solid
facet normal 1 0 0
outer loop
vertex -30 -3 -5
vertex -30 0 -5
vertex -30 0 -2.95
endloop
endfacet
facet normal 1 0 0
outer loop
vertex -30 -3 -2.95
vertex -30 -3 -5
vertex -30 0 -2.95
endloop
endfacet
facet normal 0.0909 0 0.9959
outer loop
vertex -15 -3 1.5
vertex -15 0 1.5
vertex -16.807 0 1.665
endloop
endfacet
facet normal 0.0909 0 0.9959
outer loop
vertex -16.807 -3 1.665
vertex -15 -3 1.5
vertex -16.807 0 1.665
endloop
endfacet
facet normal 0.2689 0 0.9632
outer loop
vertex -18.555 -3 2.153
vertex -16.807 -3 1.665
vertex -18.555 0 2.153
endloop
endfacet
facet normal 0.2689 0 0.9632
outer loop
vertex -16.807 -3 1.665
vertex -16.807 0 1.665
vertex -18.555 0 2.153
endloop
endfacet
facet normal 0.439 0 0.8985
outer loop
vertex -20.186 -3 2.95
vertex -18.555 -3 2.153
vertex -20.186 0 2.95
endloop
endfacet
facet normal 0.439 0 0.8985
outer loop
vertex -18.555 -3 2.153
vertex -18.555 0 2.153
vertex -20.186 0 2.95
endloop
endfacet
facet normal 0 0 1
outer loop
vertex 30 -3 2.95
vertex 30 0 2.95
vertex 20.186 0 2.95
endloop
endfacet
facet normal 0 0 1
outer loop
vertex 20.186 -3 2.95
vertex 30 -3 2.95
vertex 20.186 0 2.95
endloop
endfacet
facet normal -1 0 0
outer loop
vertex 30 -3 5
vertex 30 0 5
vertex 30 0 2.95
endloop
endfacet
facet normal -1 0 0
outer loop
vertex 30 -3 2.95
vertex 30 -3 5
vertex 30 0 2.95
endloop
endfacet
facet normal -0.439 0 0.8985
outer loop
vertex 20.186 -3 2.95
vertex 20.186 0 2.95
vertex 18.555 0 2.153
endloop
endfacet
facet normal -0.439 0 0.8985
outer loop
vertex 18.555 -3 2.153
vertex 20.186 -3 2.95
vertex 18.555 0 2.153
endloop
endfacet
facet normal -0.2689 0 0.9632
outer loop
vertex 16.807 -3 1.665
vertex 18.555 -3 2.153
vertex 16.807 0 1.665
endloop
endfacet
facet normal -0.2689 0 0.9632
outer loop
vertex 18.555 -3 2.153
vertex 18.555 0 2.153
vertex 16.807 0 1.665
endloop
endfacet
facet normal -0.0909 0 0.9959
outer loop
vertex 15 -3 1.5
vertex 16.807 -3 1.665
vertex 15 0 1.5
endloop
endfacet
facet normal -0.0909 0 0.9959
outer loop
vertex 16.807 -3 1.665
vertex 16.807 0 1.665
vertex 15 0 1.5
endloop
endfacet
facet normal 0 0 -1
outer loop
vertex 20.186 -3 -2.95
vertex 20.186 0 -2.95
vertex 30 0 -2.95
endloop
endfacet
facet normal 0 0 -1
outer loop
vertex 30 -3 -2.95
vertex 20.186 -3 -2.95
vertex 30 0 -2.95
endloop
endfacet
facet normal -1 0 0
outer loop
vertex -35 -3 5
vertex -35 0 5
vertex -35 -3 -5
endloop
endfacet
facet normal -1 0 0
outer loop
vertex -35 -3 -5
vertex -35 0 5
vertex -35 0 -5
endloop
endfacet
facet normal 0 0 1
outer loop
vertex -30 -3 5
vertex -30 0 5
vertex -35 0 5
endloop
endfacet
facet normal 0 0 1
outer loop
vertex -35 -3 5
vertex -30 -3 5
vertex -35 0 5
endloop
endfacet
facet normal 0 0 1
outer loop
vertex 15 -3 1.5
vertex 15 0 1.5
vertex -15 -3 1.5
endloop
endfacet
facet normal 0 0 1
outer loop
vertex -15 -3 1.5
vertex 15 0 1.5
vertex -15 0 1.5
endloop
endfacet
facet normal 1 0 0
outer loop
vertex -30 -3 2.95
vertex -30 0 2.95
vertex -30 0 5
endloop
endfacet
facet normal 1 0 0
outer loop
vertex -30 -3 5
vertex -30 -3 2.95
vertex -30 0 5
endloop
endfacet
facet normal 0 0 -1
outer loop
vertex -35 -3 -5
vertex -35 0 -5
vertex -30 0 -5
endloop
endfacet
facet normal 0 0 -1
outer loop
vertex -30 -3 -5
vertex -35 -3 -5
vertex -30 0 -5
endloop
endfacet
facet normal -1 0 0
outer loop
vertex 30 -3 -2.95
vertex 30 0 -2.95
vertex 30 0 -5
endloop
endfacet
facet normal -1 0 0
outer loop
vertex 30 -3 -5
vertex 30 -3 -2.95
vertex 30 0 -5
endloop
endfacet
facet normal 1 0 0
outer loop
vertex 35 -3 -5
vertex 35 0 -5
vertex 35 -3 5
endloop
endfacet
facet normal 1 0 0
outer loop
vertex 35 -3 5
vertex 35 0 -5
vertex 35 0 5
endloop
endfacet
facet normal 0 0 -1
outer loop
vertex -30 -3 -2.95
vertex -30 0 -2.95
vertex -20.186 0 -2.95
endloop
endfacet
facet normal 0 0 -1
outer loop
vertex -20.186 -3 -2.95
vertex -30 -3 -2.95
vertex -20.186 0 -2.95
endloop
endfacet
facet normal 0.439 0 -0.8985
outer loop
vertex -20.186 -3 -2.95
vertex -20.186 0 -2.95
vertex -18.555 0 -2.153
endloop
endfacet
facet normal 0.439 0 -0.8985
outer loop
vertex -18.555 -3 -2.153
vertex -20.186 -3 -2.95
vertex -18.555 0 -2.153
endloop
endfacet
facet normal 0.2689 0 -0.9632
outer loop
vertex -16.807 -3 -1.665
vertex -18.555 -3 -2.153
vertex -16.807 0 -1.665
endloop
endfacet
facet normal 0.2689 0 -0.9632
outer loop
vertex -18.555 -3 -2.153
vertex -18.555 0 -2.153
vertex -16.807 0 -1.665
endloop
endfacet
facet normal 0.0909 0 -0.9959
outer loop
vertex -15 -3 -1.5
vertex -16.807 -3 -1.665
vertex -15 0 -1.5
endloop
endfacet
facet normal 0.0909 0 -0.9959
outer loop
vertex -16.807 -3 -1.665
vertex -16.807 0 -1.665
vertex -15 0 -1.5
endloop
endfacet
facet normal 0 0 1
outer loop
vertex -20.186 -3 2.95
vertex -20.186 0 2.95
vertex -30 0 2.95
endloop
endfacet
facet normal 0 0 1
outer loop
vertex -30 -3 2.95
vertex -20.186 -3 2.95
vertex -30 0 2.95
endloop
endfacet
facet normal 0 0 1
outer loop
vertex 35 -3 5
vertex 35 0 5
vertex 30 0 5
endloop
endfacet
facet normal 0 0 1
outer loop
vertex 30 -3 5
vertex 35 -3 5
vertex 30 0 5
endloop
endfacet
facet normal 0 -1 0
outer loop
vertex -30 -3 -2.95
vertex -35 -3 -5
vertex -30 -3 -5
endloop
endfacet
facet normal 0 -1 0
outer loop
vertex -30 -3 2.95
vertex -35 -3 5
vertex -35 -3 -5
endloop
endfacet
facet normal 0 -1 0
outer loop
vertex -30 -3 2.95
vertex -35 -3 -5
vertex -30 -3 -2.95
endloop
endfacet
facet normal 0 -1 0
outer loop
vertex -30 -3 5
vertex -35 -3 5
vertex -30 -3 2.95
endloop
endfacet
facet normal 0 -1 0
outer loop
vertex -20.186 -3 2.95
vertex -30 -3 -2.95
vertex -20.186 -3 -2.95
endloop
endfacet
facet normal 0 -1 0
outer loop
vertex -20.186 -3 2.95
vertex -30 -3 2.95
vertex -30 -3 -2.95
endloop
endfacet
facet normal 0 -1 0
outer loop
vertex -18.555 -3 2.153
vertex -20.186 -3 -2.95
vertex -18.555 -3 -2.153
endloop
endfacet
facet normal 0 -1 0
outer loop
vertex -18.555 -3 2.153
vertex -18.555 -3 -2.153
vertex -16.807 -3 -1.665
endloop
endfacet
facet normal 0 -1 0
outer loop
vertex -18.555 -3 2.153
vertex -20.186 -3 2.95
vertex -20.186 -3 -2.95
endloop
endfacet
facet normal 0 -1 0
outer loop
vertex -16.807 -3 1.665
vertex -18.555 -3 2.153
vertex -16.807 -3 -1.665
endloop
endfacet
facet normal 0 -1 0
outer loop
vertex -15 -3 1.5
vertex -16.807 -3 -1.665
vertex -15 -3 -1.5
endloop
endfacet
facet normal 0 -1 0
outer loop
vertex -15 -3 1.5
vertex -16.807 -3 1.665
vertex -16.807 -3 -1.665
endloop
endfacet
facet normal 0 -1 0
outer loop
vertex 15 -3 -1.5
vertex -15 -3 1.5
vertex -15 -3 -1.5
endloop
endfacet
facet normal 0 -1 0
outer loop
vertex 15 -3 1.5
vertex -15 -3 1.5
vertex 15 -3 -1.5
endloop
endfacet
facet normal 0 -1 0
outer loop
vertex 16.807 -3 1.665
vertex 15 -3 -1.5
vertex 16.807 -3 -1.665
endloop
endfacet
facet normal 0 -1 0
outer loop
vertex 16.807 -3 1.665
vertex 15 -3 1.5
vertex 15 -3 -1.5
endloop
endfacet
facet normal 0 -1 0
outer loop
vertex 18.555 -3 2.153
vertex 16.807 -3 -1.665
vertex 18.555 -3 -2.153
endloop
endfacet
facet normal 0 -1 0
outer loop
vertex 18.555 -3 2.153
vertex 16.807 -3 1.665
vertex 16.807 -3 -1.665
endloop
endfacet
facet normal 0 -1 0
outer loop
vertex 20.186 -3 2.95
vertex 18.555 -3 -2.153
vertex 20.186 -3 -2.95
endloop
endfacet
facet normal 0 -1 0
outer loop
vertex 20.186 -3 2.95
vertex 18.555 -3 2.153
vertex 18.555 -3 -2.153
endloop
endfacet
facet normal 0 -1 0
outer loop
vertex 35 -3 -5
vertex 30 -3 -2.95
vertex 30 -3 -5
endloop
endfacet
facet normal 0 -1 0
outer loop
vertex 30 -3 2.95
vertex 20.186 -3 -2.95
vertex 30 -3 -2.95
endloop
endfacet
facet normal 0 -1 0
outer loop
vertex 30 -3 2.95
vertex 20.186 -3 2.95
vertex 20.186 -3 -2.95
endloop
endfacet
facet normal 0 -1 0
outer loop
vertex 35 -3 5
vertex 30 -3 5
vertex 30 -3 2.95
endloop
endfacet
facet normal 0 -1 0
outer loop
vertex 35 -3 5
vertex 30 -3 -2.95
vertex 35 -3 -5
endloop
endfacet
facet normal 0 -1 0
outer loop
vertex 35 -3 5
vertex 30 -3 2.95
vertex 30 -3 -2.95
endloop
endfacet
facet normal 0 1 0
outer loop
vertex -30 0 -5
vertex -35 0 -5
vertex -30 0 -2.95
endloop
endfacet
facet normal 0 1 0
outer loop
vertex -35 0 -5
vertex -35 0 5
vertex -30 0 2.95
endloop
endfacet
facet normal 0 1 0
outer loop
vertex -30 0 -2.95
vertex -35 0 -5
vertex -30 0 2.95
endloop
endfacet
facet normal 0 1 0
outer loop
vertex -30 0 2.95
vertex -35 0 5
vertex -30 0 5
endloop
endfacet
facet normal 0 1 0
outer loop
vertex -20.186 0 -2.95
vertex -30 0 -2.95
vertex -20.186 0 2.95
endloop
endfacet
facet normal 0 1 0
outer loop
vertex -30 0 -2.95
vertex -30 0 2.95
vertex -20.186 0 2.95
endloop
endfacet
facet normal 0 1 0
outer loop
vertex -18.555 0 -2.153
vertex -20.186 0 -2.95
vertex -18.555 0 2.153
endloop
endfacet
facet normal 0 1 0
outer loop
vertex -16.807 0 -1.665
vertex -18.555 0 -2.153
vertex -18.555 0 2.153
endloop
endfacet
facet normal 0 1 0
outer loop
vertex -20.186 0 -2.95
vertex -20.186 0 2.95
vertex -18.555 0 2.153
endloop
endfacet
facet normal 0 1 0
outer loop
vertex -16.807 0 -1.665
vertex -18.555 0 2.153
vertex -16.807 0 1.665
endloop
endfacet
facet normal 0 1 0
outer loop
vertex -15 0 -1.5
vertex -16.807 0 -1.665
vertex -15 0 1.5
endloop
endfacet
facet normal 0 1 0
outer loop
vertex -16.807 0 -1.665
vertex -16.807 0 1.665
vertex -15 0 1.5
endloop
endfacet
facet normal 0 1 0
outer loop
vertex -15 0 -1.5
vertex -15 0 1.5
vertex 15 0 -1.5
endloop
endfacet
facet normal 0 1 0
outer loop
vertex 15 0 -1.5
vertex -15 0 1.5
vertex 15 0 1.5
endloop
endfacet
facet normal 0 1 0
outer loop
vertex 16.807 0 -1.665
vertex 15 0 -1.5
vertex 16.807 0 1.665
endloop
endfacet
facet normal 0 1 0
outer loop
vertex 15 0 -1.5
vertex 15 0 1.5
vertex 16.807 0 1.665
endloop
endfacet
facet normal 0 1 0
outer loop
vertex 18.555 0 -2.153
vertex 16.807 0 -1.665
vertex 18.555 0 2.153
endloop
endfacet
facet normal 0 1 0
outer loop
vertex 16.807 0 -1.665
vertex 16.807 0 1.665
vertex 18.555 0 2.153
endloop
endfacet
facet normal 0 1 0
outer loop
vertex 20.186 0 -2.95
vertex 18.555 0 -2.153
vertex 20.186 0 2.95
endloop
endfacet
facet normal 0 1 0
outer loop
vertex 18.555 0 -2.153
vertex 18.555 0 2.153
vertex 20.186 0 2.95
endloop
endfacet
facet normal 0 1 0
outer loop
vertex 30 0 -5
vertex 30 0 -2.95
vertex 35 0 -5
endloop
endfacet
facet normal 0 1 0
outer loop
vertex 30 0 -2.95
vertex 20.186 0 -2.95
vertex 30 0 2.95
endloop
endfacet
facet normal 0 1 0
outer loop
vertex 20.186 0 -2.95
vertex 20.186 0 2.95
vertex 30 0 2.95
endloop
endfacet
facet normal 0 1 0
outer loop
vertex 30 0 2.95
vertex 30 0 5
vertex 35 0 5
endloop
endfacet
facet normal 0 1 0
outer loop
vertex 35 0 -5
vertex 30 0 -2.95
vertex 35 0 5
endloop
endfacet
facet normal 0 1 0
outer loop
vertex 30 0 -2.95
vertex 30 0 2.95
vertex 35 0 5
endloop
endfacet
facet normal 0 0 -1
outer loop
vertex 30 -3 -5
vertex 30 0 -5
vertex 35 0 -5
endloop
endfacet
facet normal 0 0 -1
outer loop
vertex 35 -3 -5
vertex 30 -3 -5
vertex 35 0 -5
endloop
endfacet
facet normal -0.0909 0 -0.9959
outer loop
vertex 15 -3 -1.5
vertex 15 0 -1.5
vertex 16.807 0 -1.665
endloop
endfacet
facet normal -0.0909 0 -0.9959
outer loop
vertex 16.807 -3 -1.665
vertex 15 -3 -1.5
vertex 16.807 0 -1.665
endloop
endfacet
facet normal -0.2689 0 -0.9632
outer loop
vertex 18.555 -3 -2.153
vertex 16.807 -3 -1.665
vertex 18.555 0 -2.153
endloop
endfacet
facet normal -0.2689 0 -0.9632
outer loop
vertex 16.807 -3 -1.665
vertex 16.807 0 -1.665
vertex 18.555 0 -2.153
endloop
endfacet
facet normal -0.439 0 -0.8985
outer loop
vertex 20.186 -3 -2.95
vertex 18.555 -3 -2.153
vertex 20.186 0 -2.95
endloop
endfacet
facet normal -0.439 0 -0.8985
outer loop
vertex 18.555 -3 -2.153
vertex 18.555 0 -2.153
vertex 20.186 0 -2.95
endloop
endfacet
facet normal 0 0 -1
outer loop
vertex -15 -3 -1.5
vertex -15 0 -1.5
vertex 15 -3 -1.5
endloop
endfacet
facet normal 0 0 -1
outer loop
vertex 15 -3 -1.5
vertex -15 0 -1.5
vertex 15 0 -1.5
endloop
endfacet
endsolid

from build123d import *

# Parameters (mm, degrees)
F1_DEPTH = 3


with BuildPart() as f1:
    # F0 (on Front) → F1 (new body)
    with BuildSketch(Plane.XZ):
        with BuildLine():
            Line((35, -1.5), (35, 1.5))
            Line((35, 1.5), (35, 5))
            Line((35, 5), (30, 5))
            Line((30, 5), (30, 2.95))
            Line((30, 2.95), (20.18628, 2.95))
            ThreePointArc((20.18628, 2.95), (17.692582, 1.86932), (15, 1.5))
            Line((15, 1.5), (-15, 1.5))
            ThreePointArc((-15, 1.5), (-17.692582, 1.86932), (-20.18628, 2.95))
            Line((-20.18628, 2.95), (-30, 2.95))
            Line((-30, 2.95), (-30, 5))
            Line((-30, 5), (-35, 5))
            Line((-35, 5), (-35, 1.5))
            Line((-35, 1.5), (-35, -1.5))
            Line((-35, -1.5), (-35, -5))
            Line((-35, -5), (-30, -5))
            Line((-30, -5), (-30, -2.95))
            Line((-30, -2.95), (-20.18628, -2.95))
            ThreePointArc((-20.18628, -2.95), (-17.692582, -1.86932), (-15, -1.5))
            Line((-15, -1.5), (15, -1.5))
            ThreePointArc((15, -1.5), (17.692582, -1.86932), (20.18628, -2.95))
            Line((20.18628, -2.95), (30, -2.95))
            Line((30, -2.95), (30, -5))
            Line((30, -5), (35, -5))
            Line((35, -5), (35, -1.5))
        make_face()
    extrude(amount=F1_DEPTH)


solid = f1.part
